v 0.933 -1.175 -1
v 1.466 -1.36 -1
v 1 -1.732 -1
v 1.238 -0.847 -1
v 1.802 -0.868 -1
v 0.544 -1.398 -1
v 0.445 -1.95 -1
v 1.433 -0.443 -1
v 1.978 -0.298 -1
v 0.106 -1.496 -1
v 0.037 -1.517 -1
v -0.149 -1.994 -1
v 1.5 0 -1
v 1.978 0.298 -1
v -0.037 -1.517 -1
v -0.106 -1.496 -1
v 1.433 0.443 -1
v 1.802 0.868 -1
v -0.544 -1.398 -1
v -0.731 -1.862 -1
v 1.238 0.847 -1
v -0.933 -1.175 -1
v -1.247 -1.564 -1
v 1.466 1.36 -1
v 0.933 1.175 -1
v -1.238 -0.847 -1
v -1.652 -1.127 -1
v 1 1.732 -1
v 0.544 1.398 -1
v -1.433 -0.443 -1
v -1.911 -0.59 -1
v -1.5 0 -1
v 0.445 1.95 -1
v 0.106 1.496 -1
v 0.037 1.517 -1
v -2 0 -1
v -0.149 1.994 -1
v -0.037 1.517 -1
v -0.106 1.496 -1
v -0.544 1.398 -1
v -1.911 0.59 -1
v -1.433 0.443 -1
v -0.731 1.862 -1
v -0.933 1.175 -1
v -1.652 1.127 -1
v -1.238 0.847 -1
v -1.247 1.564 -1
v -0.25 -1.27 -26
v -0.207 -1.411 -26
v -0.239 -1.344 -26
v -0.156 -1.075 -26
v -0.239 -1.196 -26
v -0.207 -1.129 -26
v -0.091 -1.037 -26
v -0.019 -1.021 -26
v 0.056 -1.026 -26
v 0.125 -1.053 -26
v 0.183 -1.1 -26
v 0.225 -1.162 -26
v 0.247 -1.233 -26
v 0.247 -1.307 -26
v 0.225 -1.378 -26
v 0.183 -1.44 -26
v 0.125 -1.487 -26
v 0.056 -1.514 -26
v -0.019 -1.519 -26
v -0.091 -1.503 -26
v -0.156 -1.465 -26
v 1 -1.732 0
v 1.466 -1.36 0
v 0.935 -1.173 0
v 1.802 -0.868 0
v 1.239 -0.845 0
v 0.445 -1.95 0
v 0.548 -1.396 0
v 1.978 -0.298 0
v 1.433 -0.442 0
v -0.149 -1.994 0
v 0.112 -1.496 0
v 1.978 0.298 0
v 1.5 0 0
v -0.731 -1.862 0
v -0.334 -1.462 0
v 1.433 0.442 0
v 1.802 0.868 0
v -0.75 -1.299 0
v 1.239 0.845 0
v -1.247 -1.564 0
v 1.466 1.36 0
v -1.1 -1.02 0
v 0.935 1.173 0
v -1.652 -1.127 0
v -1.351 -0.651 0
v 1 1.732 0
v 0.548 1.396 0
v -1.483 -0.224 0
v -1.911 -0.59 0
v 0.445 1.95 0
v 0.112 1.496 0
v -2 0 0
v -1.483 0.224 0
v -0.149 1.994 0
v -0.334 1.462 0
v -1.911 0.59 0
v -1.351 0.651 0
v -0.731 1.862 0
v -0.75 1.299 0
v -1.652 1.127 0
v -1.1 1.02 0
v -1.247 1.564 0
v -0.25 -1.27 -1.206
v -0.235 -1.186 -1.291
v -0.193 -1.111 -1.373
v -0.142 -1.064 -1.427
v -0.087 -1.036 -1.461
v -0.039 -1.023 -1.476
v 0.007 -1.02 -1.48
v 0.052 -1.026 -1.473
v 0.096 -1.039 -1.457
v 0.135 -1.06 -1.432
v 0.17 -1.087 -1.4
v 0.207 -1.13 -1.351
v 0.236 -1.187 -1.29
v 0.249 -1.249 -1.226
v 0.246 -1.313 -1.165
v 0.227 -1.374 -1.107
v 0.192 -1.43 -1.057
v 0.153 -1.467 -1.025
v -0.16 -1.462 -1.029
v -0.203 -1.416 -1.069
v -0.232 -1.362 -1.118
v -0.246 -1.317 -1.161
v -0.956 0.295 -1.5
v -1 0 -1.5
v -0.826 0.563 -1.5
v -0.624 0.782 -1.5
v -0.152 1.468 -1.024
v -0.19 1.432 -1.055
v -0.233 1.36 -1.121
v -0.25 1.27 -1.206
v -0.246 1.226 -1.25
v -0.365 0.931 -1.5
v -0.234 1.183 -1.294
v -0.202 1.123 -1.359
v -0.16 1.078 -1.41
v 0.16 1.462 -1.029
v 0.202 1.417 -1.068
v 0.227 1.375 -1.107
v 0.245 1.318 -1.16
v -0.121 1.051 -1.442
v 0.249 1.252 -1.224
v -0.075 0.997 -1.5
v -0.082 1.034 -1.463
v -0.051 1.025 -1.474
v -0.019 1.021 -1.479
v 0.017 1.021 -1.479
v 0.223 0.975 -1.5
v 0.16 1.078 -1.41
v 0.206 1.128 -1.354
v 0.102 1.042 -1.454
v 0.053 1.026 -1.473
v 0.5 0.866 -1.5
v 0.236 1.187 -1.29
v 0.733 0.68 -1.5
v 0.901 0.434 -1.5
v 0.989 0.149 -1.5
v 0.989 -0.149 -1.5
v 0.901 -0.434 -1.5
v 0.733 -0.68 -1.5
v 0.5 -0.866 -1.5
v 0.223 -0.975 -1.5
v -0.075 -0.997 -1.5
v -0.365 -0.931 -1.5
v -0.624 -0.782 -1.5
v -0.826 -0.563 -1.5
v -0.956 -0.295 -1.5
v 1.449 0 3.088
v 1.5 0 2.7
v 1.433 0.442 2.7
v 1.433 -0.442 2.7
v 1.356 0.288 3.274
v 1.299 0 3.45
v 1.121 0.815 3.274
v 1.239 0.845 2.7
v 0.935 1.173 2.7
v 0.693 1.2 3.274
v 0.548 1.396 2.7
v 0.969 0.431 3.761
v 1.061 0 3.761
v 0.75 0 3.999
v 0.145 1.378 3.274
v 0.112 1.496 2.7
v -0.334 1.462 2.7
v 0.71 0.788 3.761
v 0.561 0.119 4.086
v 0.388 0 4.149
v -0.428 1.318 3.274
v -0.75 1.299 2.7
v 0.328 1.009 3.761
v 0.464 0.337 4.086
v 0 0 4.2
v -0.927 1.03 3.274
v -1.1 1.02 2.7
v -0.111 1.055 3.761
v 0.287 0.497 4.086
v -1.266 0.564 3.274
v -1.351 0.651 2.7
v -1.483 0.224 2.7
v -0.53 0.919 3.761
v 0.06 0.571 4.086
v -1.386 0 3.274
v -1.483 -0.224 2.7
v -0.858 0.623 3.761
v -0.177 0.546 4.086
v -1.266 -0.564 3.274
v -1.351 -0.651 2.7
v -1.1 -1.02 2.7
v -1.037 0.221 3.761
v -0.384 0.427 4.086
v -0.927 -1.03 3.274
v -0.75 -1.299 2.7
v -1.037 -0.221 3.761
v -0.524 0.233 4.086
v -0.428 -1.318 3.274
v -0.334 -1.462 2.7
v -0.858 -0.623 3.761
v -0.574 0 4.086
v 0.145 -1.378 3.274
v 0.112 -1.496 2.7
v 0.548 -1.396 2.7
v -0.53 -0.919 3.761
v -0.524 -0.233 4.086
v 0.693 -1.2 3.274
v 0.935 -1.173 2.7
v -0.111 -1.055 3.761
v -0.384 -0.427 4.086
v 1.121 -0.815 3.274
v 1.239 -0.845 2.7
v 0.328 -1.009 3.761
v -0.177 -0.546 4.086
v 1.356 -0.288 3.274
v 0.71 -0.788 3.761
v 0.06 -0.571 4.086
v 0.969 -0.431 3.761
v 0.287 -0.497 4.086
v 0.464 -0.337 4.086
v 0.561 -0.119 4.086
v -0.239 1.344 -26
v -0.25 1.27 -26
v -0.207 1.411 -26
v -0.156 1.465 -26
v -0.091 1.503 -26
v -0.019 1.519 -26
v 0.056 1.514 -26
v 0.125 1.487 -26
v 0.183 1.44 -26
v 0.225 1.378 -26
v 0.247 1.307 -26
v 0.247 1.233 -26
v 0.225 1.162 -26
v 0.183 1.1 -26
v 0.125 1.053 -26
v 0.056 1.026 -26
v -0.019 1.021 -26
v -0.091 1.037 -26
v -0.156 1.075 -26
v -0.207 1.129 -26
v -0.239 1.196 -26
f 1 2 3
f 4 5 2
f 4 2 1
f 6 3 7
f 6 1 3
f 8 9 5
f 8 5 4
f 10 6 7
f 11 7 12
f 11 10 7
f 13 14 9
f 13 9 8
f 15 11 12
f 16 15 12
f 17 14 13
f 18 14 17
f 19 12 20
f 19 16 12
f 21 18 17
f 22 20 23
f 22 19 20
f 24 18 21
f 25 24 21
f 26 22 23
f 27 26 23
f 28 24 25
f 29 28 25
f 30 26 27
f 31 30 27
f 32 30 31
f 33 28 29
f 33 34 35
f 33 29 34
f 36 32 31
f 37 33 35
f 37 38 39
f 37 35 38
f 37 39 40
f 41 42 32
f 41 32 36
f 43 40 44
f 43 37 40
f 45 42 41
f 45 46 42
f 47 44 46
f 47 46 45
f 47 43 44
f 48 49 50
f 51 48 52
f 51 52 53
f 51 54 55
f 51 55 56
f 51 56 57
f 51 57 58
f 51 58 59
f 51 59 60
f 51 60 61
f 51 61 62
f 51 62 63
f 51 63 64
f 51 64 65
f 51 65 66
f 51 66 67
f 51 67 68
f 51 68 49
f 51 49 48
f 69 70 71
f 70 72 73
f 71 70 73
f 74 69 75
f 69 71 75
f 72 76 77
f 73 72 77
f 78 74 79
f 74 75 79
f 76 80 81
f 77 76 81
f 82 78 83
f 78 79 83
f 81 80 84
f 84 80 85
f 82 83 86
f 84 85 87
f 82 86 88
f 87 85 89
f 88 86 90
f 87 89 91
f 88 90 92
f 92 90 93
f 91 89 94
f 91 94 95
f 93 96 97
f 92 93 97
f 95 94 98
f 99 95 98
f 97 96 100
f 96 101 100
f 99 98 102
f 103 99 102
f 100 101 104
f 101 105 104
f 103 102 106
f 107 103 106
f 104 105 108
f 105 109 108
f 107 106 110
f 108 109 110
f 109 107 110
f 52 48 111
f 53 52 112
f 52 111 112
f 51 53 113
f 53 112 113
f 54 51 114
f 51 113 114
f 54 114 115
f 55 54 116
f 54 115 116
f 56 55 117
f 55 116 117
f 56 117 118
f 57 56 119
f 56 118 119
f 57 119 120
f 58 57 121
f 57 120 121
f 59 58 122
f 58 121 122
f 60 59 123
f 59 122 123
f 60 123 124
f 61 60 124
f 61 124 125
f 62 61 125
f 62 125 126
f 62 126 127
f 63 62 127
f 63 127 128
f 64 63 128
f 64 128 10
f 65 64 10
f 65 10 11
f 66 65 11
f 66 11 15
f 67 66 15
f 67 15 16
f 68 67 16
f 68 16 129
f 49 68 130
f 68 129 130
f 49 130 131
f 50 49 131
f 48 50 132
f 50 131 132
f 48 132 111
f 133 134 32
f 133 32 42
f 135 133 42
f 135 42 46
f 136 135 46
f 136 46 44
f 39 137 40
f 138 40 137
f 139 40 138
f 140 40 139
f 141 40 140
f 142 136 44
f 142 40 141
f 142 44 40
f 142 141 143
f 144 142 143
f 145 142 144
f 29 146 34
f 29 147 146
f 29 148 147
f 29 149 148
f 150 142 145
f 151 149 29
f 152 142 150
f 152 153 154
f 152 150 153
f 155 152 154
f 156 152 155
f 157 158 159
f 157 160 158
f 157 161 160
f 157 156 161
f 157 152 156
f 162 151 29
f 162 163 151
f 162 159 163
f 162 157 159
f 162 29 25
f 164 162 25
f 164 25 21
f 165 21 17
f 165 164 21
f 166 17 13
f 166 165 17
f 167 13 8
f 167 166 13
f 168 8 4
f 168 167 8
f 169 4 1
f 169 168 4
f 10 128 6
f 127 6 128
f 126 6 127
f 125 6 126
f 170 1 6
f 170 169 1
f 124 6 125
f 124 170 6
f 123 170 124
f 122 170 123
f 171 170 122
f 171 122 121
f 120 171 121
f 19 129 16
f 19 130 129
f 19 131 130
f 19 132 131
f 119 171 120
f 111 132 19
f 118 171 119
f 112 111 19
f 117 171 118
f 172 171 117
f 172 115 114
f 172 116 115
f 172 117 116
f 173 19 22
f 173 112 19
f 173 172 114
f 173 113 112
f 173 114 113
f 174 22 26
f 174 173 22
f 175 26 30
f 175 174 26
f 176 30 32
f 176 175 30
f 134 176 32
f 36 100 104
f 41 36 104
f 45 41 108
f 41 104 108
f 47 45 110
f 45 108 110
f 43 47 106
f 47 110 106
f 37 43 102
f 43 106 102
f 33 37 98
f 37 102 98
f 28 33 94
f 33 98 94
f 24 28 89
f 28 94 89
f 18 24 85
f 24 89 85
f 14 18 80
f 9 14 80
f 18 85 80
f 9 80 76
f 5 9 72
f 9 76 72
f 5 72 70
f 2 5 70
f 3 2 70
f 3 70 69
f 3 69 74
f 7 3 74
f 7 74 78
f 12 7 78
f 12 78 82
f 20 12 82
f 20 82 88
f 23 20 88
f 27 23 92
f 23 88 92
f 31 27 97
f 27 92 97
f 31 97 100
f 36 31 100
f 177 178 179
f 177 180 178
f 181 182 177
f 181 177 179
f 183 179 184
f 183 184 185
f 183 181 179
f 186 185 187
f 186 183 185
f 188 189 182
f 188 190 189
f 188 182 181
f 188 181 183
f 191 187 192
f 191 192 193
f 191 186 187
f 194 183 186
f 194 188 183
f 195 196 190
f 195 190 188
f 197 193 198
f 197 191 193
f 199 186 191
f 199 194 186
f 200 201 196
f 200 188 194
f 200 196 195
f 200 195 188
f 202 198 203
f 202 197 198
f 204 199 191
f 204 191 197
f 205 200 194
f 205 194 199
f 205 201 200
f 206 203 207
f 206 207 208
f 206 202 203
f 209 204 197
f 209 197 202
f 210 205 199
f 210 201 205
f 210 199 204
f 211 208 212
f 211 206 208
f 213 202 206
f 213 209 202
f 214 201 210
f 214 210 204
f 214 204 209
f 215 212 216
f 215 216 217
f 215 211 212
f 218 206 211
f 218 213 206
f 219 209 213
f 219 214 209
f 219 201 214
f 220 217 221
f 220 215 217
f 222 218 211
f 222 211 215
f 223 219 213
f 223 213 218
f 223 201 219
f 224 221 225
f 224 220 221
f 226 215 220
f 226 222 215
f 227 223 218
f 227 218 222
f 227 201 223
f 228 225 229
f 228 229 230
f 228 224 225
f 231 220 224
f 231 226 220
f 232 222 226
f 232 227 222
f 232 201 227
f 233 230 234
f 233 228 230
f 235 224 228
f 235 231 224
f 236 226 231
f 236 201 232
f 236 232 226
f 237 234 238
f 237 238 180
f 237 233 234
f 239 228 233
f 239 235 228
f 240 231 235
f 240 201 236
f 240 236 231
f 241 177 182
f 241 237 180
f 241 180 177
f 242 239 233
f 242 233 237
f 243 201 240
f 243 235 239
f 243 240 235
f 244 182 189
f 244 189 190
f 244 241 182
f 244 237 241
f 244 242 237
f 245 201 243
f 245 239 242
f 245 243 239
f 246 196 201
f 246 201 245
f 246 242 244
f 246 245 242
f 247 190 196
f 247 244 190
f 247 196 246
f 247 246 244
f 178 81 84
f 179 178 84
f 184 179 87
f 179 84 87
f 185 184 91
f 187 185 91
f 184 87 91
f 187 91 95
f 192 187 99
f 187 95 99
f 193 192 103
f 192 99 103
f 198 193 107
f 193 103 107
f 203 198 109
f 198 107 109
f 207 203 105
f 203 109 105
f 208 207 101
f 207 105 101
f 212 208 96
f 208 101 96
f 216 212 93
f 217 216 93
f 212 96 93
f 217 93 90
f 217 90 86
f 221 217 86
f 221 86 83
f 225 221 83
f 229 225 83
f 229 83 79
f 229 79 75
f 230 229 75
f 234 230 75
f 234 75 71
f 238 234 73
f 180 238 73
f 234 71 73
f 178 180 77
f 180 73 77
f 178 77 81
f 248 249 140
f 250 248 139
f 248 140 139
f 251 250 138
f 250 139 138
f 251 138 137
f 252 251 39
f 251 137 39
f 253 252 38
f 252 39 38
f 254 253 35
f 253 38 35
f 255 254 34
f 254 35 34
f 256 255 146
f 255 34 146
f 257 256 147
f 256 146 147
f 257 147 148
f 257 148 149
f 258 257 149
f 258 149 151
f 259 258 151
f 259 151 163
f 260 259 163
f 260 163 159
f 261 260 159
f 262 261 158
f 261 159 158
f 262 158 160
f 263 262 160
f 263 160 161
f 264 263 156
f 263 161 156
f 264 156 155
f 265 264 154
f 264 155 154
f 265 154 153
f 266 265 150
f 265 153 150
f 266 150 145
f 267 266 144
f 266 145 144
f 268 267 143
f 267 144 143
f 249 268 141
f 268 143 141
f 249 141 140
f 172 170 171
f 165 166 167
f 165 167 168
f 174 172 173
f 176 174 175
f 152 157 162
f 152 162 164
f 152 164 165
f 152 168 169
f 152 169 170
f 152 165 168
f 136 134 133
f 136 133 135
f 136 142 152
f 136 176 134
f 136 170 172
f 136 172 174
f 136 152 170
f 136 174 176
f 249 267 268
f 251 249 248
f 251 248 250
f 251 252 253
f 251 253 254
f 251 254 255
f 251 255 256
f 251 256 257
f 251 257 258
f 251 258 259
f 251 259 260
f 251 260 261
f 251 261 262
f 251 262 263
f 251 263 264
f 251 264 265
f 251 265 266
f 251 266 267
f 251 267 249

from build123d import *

# Parameters (mm, degrees)
SKETCH_1_R           = 1.5
EXTRUDE_1_DEPTH      = 4.2
FILLET_1_R           = 1.5
SKETCH_2_R           = 2
EXTRUDE_2_DEPTH      = 1
EXTRUDE_START        = 0.5
SKETCH_3_R           = 1.5
EXTRUDE_3_DEPTH      = 0.5
CHAMFER_1_SIZE       = 0.5
EXTRUDE_4_DEPTH      = 24.5
EXTRUDE_4_DEPTH_BACK = 0.5
SKETCH_4_R           = 0.25


with BuildPart() as part:
    # Эскиз1 → Бобышка-Вытянуть1 (new body)
    with BuildSketch(Plane.XY):
        Circle(SKETCH_1_R)
    extrude(amount=EXTRUDE_1_DEPTH)

    # Скругление1
    fillet_1_edges = [part.edges().sort_by_distance(p)[0] for p in [
        (-1.5, 0, 4.2),
    ]]
    fillet(fillet_1_edges, radius=FILLET_1_R)

    # Эскиз2 → Бобышка-Вытянуть2 (add)
    with BuildSketch(Plane(origin=(0, 0, 0), x_dir=(-1, 0, 0), z_dir=(0, 0, -1))):
        Circle(SKETCH_2_R)
    extrude(amount=EXTRUDE_2_DEPTH)

    # Эскиз3 → Бобышка-Вытянуть3 (add)
    with BuildSketch(Plane(origin=(0, 0, -1), x_dir=(-1, 0, 0), z_dir=(0, 0, -1)).offset(EXTRUDE_START)):
        Circle(SKETCH_3_R)
    extrude(amount=-EXTRUDE_3_DEPTH)

    # Фаска1
    chamfer_1_edges = [part.edges().sort_by_distance(p)[0] for p in [
        (1.5, 0, -1.5),
    ]]
    chamfer(chamfer_1_edges, length=CHAMFER_1_SIZE - 0.0001)  # a hair under: the kernel refuses the full size

    # Эскиз4 → Бобышка-Вытянуть4 (add, two sides: drawn at the far end of the back side and taken through both)
    with BuildSketch(Plane(origin=(0, 0, -1.5), x_dir=(-1, 0, 0), z_dir=(0, 0, -1)).offset(-EXTRUDE_4_DEPTH_BACK)):
        with Locations((0, 1.27)):
            Circle(SKETCH_4_R)
        with Locations((0, -1.27)):
            Circle(SKETCH_4_R)
    extrude(amount=EXTRUDE_4_DEPTH + EXTRUDE_4_DEPTH_BACK)


solid = part.part
